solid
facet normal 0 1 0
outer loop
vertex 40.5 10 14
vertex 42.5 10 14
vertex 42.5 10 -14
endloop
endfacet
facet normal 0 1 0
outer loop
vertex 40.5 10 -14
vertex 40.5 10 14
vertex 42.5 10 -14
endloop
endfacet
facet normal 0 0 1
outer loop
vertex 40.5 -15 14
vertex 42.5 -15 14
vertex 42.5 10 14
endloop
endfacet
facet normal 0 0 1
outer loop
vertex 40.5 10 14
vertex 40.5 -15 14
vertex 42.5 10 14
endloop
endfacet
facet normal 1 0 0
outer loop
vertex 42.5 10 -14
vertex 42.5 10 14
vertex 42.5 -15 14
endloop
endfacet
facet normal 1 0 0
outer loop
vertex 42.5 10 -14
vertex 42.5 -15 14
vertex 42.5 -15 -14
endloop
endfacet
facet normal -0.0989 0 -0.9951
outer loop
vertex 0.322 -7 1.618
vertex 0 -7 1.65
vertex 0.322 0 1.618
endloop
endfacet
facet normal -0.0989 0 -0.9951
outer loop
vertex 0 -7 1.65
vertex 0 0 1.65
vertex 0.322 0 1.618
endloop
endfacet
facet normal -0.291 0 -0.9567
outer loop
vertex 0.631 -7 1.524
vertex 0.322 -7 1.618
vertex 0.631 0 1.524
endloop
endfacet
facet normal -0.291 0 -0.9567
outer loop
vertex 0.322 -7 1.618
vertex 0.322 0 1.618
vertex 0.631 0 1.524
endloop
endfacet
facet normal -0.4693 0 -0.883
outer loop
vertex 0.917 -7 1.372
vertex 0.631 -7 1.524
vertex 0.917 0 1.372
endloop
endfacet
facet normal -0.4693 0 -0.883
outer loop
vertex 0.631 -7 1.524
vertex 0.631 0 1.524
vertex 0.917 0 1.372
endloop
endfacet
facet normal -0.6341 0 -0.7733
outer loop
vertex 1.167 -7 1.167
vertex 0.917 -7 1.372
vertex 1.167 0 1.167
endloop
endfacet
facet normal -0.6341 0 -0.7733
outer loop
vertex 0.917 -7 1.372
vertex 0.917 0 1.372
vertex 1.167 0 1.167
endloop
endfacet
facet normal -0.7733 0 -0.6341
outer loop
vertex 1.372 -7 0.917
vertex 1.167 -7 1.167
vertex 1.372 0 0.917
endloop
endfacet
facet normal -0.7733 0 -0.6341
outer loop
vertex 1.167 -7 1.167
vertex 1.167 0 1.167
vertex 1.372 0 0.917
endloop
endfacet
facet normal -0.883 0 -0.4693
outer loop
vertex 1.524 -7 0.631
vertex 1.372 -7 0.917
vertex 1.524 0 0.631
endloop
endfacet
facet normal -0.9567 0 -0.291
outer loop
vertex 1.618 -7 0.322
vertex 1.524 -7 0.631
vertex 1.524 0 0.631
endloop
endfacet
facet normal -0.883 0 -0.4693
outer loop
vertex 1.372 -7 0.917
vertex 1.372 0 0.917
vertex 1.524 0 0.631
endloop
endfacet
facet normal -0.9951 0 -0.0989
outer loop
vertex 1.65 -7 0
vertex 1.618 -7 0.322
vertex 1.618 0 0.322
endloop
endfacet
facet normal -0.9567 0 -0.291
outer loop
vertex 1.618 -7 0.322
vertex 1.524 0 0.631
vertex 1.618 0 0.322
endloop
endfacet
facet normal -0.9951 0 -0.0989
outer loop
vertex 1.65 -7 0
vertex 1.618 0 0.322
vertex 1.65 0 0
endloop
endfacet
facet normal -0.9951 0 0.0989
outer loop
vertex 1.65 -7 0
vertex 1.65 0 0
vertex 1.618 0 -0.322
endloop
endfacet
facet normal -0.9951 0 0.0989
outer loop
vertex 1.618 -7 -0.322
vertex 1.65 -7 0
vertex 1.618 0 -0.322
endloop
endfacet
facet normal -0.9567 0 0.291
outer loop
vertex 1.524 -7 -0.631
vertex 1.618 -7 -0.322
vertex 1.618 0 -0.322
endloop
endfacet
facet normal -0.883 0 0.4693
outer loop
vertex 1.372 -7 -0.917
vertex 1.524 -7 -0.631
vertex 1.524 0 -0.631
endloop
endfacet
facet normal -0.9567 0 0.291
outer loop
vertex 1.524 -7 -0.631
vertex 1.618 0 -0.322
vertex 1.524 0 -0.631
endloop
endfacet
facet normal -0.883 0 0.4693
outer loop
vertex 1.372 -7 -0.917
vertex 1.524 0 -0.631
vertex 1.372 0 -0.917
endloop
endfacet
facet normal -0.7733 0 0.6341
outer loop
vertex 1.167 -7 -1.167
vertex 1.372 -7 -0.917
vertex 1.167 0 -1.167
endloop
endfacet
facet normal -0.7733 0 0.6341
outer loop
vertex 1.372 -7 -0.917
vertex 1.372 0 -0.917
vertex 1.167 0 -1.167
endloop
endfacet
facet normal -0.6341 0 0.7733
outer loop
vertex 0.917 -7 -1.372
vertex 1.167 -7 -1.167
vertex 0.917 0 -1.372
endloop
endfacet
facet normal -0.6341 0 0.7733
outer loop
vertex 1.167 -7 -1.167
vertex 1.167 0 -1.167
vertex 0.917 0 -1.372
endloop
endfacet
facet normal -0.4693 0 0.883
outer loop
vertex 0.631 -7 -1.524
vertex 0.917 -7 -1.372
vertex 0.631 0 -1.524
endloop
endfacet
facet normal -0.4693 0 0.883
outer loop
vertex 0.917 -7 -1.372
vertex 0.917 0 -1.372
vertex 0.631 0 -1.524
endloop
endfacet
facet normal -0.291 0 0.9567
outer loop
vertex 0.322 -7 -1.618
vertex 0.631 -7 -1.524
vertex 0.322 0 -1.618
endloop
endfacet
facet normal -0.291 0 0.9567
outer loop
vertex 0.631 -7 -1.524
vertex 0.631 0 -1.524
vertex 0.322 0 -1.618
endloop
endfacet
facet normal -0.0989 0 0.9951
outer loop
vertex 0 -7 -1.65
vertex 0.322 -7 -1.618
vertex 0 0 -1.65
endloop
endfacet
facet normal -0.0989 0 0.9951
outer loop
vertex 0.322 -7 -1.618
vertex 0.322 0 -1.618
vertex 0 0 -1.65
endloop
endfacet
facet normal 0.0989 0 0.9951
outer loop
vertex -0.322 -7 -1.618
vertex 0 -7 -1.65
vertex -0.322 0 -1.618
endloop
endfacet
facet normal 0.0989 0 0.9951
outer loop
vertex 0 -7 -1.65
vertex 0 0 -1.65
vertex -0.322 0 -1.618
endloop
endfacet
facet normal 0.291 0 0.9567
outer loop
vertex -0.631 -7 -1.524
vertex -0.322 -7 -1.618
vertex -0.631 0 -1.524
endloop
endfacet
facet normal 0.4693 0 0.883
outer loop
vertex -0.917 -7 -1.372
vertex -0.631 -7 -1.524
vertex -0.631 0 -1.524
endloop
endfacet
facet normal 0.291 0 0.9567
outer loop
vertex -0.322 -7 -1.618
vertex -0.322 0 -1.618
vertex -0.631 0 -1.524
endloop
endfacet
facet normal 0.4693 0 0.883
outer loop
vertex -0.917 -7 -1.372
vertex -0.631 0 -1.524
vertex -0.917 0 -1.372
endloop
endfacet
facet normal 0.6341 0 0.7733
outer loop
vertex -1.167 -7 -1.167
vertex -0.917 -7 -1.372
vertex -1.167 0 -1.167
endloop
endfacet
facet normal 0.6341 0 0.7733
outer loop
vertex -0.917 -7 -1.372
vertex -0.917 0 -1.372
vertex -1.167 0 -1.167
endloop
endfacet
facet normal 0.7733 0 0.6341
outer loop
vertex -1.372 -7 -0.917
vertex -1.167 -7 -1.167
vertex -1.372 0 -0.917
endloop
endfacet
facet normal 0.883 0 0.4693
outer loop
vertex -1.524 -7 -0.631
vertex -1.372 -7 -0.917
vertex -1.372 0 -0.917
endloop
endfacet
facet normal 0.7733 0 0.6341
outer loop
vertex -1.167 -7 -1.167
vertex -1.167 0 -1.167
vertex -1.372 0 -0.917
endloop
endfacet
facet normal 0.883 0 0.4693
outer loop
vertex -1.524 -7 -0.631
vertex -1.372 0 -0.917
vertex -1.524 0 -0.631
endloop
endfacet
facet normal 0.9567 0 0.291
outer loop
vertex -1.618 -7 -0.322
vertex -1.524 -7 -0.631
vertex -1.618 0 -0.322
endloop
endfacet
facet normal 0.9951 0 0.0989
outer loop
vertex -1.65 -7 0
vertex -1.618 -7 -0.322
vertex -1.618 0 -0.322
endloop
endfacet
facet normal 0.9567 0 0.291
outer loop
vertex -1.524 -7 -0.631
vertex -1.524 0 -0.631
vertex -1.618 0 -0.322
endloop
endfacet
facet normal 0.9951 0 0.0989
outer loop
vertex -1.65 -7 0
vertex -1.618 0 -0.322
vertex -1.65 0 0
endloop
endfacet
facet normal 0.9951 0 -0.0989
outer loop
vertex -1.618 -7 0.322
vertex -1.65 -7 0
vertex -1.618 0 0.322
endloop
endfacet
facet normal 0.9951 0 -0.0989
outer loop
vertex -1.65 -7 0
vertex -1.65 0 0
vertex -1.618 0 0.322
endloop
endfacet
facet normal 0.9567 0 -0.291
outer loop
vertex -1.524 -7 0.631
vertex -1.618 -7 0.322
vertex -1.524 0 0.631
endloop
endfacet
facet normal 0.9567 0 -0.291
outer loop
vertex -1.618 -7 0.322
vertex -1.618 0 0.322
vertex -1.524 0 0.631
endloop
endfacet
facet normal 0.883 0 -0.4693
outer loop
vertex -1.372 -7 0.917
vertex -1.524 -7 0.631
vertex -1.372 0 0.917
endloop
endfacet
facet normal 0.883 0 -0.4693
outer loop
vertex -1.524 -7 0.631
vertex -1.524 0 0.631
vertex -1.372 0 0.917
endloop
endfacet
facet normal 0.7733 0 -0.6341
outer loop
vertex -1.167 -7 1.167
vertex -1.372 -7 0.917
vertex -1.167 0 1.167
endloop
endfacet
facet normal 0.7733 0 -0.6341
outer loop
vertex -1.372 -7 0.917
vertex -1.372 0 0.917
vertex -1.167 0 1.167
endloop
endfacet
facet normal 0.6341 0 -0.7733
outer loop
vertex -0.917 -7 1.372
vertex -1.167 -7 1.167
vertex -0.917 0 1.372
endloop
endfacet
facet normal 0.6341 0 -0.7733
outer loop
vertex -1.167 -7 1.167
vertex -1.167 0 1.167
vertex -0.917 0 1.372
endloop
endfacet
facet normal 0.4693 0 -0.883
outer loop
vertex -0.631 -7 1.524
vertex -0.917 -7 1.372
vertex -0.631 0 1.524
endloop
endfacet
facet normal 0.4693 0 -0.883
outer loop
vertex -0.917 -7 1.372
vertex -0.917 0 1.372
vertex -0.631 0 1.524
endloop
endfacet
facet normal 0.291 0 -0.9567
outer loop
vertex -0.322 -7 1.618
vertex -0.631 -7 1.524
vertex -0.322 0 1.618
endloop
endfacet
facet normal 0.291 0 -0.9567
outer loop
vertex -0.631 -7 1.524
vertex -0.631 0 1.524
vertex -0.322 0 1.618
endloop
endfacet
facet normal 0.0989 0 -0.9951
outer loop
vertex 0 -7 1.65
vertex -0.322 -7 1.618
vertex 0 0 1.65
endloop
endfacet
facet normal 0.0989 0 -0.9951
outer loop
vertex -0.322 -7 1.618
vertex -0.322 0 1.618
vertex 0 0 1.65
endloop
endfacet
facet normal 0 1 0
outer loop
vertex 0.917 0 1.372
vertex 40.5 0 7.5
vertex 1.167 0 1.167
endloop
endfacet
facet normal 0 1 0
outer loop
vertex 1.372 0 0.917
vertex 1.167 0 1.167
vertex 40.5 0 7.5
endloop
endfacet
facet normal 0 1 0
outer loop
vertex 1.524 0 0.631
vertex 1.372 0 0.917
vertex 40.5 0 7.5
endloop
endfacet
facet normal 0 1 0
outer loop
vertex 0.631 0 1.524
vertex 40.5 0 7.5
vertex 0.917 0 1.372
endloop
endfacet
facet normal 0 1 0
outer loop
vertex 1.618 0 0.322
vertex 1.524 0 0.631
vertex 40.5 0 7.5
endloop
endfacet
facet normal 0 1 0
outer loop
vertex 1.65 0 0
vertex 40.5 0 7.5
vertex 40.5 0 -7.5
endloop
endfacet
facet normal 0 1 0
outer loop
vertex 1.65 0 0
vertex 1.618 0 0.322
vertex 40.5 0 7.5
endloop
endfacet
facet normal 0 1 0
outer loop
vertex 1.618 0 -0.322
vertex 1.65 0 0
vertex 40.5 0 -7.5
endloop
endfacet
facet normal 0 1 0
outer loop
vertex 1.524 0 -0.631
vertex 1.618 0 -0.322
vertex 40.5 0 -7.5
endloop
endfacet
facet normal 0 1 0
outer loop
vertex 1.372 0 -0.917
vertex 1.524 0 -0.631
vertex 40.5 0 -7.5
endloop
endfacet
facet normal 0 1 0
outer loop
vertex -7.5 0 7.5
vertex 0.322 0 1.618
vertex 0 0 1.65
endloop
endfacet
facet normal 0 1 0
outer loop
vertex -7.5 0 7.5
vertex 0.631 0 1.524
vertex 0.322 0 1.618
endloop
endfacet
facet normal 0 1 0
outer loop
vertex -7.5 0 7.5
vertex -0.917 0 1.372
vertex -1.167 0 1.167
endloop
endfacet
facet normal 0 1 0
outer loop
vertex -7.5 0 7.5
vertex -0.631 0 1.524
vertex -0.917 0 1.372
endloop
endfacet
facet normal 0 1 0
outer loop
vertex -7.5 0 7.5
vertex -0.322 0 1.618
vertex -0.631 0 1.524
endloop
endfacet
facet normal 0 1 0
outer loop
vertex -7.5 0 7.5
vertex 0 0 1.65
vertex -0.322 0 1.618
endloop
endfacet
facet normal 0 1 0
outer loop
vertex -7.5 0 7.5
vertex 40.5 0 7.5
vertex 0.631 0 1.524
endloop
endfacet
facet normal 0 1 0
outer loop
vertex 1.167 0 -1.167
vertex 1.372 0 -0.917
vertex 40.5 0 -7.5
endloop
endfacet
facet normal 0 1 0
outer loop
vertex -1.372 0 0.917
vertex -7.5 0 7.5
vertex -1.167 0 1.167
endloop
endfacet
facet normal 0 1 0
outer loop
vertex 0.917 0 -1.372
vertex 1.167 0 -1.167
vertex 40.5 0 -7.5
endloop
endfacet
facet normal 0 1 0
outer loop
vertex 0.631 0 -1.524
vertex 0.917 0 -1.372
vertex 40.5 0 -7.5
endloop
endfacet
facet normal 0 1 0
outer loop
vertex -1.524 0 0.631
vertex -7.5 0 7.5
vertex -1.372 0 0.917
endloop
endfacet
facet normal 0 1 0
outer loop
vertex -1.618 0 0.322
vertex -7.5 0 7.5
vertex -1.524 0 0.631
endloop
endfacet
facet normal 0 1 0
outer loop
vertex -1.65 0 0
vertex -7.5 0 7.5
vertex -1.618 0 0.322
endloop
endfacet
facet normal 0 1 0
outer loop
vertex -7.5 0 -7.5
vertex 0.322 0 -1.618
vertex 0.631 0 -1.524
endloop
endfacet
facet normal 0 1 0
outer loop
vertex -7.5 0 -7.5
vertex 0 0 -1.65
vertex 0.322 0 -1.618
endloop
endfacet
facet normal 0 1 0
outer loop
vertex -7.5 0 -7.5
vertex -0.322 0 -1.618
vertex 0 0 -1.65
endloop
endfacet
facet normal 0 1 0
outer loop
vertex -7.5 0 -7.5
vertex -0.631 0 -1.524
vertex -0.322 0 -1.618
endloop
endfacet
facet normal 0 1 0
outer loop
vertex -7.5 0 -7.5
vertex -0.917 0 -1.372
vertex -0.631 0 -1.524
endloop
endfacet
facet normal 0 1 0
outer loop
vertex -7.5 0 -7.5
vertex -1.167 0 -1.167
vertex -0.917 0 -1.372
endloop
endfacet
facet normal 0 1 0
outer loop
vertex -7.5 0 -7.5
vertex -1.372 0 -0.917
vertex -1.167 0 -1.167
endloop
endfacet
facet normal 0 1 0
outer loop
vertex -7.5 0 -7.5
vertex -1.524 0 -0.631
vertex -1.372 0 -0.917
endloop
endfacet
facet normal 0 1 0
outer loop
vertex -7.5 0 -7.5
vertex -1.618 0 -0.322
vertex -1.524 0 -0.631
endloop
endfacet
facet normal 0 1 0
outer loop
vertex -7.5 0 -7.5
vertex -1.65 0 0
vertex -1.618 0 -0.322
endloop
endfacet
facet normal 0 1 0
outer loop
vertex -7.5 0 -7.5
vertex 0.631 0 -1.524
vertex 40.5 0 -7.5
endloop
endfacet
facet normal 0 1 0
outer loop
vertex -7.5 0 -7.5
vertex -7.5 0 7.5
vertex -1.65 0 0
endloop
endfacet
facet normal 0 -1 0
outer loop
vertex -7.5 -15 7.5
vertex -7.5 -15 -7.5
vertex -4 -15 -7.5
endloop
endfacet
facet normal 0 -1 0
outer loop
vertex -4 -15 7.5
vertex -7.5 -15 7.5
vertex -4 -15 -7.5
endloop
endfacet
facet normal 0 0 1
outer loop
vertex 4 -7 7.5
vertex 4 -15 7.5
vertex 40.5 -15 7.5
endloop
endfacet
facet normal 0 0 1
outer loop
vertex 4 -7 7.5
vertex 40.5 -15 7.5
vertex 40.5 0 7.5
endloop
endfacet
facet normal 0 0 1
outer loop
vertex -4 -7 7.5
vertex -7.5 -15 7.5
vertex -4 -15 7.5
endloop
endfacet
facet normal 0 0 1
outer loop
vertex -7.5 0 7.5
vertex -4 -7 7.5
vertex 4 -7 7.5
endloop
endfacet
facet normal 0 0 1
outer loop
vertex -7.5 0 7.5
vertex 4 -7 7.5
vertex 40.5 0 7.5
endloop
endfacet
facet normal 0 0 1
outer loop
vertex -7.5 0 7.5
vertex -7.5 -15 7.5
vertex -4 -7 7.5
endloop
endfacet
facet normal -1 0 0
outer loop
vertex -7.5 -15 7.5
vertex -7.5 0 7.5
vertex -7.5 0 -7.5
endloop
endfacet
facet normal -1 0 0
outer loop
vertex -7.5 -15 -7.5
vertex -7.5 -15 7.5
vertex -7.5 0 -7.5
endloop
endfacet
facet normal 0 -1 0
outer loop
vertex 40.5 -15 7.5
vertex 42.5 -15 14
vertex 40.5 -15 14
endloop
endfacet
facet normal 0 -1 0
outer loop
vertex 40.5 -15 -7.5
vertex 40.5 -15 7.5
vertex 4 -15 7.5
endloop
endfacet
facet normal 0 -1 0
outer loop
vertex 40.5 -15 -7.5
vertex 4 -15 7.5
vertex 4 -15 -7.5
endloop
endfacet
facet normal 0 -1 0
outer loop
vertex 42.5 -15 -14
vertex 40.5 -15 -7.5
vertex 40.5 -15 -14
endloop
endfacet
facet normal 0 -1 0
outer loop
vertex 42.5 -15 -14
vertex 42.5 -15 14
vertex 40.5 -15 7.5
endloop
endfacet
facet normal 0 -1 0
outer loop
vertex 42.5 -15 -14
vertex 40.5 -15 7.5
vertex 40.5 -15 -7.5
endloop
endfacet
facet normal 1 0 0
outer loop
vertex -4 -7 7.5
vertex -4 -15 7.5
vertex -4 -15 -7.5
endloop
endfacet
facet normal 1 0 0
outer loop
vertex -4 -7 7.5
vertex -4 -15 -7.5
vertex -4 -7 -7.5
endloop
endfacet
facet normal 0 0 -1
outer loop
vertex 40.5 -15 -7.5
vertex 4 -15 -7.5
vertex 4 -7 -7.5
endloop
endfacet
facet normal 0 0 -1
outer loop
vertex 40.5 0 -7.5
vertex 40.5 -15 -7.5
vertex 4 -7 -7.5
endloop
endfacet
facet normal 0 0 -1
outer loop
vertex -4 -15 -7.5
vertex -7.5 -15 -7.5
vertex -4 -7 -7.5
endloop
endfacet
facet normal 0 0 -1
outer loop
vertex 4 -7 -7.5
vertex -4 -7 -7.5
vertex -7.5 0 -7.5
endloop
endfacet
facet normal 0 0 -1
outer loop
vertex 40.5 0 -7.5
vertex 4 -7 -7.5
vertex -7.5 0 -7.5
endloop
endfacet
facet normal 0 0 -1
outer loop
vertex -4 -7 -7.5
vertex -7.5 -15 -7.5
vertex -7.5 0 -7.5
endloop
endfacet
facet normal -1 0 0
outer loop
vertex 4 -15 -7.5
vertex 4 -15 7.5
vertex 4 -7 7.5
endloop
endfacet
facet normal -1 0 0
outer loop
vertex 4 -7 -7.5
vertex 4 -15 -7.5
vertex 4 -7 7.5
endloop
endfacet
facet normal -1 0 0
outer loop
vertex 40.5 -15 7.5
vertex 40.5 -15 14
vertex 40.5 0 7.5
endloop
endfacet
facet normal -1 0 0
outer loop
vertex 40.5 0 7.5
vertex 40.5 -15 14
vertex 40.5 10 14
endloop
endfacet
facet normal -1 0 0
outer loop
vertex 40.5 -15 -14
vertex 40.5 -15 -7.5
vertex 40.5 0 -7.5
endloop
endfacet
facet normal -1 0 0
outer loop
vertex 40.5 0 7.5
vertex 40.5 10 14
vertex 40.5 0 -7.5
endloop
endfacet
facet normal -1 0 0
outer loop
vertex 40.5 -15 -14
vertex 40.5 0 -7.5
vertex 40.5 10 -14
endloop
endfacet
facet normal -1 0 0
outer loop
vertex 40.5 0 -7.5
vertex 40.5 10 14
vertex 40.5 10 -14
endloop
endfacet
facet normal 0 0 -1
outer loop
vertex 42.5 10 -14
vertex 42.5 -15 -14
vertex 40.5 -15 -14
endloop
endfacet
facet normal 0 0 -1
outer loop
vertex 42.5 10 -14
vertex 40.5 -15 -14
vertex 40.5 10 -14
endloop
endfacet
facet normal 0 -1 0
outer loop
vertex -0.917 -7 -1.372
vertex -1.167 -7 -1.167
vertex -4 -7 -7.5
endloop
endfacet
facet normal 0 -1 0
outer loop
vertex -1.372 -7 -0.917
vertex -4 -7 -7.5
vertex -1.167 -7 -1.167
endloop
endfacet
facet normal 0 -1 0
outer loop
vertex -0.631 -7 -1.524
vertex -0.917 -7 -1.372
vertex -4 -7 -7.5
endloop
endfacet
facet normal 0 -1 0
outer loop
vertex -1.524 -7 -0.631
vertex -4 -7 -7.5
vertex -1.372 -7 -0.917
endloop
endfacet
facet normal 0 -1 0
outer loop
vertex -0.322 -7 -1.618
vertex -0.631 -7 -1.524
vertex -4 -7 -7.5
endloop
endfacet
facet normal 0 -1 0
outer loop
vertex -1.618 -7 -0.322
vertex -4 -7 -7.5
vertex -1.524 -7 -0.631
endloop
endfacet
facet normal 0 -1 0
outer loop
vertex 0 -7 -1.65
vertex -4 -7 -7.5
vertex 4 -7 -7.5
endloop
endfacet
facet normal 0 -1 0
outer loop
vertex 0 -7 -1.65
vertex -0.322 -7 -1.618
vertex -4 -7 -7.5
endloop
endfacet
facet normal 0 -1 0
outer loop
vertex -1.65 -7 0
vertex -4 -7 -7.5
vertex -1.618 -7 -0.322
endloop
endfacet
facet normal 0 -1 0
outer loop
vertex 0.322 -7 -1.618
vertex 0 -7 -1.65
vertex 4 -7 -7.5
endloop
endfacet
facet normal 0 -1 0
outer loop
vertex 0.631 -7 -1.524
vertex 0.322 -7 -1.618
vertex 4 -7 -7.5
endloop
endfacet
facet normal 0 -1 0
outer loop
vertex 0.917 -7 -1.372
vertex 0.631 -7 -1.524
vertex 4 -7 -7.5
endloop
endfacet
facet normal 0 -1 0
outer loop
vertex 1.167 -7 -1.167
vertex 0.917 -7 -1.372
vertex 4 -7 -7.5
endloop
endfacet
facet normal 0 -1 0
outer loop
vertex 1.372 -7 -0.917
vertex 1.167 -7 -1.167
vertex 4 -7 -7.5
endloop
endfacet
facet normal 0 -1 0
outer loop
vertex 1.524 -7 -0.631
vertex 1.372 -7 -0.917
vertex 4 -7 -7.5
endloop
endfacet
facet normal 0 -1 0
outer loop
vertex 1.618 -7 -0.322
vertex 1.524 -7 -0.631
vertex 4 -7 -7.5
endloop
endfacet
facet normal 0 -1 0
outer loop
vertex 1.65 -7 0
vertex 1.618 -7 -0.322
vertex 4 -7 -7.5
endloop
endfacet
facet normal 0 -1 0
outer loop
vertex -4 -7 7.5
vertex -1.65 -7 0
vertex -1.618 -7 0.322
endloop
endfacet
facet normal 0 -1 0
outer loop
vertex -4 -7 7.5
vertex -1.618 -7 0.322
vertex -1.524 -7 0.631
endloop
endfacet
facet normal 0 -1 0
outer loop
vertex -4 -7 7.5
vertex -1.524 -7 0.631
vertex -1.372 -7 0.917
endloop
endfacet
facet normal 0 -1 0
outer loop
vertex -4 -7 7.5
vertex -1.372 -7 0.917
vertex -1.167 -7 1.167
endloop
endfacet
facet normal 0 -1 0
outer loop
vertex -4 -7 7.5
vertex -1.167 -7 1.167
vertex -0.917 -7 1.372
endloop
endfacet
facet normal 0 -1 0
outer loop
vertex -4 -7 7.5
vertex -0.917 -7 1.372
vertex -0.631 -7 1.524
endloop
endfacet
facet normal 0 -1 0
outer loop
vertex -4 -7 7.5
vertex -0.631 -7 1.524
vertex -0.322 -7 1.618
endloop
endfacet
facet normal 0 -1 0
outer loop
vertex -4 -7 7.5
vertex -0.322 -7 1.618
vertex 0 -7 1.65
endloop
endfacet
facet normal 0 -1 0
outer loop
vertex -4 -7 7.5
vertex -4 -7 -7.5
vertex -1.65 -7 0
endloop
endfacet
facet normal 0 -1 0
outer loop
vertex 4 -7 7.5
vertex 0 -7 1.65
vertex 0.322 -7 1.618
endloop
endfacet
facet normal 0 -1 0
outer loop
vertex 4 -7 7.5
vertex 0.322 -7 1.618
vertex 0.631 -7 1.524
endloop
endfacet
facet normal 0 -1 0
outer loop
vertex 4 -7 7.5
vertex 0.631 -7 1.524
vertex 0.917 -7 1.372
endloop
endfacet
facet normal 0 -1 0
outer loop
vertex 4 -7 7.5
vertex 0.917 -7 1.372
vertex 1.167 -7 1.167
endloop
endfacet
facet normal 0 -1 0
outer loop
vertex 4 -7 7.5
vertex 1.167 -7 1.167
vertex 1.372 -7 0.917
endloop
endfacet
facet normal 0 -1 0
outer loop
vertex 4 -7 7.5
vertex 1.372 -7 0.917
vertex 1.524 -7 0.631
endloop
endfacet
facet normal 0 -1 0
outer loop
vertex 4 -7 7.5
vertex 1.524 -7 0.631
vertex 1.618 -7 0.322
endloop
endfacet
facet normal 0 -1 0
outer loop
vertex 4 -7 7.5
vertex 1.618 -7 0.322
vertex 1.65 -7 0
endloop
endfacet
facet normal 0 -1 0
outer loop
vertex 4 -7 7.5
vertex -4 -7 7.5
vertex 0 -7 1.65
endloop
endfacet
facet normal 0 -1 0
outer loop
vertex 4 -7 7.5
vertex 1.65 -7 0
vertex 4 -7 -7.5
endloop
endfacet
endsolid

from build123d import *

# Parameters (mm, degrees)
SKETCH_1_W          = 15
SKETCH_1_H          = 15
EXTRUDE_1_DEPTH     = 15
SKETCH_2_W          = 8
SKETCH_2_H          = 8
CUT_EXTRUDE_1_DEPTH = 17.5
SKETCH_3_R          = 1.65
CUT_EXTRUDE_2_DEPTH = 17.5
SKETCH_5_W          = 15
SKETCH_5_H          = 15
EXTRUDE_2_DEPTH     = 35
SKETCH_6_W          = 28
SKETCH_6_H          = 25
EXTRUDE_3_DEPTH     = 2


with BuildPart() as part:
    # 草图1 → 凸台-拉伸1 (new body)
    with BuildSketch(Plane(origin=(0, 0, 0), x_dir=(1, 0, 0), z_dir=(0, 1, 0))):
        Rectangle(SKETCH_1_W, SKETCH_1_H)
    extrude(amount=-EXTRUDE_1_DEPTH)

    # 草图2 → 切除-拉伸1 (cut, symmetric)
    with BuildSketch(Plane.XY):
        with Locations((0, -11)):
            Rectangle(SKETCH_2_W, SKETCH_2_H)
    extrude(amount=CUT_EXTRUDE_1_DEPTH, both=True, mode=Mode.SUBTRACT)

    # 草图3 → 切除-拉伸2 (cut, symmetric)
    with BuildSketch(Plane(origin=(0, 0, 0), x_dir=(1, 0, 0), z_dir=(0, 1, 0))):
        with Locations(Location((0, 0, 0), (0, 0, 270))):
            Circle(SKETCH_3_R)
    extrude(amount=CUT_EXTRUDE_2_DEPTH, both=True, mode=Mode.SUBTRACT)

    # 草图5 → 凸台-拉伸2 (add)
    with BuildSketch(Plane(origin=(7.5, 0, 0), x_dir=(0, 0, -1), z_dir=(1, 0, 0))):
        with Locations((0, -7.5)):
            Rectangle(SKETCH_5_W, SKETCH_5_H)
    extrude(amount=EXTRUDE_2_DEPTH)

    # 草图6 → 凸台-拉伸3 (add)
    with BuildSketch(Plane(origin=(42.5, 0, 0), x_dir=(0, 0, -1), z_dir=(1, 0, 0))):
        with Locations((0, -2.5)):
            Rectangle(SKETCH_6_W, SKETCH_6_H)
    extrude(amount=-EXTRUDE_3_DEPTH)


solid = part.part
